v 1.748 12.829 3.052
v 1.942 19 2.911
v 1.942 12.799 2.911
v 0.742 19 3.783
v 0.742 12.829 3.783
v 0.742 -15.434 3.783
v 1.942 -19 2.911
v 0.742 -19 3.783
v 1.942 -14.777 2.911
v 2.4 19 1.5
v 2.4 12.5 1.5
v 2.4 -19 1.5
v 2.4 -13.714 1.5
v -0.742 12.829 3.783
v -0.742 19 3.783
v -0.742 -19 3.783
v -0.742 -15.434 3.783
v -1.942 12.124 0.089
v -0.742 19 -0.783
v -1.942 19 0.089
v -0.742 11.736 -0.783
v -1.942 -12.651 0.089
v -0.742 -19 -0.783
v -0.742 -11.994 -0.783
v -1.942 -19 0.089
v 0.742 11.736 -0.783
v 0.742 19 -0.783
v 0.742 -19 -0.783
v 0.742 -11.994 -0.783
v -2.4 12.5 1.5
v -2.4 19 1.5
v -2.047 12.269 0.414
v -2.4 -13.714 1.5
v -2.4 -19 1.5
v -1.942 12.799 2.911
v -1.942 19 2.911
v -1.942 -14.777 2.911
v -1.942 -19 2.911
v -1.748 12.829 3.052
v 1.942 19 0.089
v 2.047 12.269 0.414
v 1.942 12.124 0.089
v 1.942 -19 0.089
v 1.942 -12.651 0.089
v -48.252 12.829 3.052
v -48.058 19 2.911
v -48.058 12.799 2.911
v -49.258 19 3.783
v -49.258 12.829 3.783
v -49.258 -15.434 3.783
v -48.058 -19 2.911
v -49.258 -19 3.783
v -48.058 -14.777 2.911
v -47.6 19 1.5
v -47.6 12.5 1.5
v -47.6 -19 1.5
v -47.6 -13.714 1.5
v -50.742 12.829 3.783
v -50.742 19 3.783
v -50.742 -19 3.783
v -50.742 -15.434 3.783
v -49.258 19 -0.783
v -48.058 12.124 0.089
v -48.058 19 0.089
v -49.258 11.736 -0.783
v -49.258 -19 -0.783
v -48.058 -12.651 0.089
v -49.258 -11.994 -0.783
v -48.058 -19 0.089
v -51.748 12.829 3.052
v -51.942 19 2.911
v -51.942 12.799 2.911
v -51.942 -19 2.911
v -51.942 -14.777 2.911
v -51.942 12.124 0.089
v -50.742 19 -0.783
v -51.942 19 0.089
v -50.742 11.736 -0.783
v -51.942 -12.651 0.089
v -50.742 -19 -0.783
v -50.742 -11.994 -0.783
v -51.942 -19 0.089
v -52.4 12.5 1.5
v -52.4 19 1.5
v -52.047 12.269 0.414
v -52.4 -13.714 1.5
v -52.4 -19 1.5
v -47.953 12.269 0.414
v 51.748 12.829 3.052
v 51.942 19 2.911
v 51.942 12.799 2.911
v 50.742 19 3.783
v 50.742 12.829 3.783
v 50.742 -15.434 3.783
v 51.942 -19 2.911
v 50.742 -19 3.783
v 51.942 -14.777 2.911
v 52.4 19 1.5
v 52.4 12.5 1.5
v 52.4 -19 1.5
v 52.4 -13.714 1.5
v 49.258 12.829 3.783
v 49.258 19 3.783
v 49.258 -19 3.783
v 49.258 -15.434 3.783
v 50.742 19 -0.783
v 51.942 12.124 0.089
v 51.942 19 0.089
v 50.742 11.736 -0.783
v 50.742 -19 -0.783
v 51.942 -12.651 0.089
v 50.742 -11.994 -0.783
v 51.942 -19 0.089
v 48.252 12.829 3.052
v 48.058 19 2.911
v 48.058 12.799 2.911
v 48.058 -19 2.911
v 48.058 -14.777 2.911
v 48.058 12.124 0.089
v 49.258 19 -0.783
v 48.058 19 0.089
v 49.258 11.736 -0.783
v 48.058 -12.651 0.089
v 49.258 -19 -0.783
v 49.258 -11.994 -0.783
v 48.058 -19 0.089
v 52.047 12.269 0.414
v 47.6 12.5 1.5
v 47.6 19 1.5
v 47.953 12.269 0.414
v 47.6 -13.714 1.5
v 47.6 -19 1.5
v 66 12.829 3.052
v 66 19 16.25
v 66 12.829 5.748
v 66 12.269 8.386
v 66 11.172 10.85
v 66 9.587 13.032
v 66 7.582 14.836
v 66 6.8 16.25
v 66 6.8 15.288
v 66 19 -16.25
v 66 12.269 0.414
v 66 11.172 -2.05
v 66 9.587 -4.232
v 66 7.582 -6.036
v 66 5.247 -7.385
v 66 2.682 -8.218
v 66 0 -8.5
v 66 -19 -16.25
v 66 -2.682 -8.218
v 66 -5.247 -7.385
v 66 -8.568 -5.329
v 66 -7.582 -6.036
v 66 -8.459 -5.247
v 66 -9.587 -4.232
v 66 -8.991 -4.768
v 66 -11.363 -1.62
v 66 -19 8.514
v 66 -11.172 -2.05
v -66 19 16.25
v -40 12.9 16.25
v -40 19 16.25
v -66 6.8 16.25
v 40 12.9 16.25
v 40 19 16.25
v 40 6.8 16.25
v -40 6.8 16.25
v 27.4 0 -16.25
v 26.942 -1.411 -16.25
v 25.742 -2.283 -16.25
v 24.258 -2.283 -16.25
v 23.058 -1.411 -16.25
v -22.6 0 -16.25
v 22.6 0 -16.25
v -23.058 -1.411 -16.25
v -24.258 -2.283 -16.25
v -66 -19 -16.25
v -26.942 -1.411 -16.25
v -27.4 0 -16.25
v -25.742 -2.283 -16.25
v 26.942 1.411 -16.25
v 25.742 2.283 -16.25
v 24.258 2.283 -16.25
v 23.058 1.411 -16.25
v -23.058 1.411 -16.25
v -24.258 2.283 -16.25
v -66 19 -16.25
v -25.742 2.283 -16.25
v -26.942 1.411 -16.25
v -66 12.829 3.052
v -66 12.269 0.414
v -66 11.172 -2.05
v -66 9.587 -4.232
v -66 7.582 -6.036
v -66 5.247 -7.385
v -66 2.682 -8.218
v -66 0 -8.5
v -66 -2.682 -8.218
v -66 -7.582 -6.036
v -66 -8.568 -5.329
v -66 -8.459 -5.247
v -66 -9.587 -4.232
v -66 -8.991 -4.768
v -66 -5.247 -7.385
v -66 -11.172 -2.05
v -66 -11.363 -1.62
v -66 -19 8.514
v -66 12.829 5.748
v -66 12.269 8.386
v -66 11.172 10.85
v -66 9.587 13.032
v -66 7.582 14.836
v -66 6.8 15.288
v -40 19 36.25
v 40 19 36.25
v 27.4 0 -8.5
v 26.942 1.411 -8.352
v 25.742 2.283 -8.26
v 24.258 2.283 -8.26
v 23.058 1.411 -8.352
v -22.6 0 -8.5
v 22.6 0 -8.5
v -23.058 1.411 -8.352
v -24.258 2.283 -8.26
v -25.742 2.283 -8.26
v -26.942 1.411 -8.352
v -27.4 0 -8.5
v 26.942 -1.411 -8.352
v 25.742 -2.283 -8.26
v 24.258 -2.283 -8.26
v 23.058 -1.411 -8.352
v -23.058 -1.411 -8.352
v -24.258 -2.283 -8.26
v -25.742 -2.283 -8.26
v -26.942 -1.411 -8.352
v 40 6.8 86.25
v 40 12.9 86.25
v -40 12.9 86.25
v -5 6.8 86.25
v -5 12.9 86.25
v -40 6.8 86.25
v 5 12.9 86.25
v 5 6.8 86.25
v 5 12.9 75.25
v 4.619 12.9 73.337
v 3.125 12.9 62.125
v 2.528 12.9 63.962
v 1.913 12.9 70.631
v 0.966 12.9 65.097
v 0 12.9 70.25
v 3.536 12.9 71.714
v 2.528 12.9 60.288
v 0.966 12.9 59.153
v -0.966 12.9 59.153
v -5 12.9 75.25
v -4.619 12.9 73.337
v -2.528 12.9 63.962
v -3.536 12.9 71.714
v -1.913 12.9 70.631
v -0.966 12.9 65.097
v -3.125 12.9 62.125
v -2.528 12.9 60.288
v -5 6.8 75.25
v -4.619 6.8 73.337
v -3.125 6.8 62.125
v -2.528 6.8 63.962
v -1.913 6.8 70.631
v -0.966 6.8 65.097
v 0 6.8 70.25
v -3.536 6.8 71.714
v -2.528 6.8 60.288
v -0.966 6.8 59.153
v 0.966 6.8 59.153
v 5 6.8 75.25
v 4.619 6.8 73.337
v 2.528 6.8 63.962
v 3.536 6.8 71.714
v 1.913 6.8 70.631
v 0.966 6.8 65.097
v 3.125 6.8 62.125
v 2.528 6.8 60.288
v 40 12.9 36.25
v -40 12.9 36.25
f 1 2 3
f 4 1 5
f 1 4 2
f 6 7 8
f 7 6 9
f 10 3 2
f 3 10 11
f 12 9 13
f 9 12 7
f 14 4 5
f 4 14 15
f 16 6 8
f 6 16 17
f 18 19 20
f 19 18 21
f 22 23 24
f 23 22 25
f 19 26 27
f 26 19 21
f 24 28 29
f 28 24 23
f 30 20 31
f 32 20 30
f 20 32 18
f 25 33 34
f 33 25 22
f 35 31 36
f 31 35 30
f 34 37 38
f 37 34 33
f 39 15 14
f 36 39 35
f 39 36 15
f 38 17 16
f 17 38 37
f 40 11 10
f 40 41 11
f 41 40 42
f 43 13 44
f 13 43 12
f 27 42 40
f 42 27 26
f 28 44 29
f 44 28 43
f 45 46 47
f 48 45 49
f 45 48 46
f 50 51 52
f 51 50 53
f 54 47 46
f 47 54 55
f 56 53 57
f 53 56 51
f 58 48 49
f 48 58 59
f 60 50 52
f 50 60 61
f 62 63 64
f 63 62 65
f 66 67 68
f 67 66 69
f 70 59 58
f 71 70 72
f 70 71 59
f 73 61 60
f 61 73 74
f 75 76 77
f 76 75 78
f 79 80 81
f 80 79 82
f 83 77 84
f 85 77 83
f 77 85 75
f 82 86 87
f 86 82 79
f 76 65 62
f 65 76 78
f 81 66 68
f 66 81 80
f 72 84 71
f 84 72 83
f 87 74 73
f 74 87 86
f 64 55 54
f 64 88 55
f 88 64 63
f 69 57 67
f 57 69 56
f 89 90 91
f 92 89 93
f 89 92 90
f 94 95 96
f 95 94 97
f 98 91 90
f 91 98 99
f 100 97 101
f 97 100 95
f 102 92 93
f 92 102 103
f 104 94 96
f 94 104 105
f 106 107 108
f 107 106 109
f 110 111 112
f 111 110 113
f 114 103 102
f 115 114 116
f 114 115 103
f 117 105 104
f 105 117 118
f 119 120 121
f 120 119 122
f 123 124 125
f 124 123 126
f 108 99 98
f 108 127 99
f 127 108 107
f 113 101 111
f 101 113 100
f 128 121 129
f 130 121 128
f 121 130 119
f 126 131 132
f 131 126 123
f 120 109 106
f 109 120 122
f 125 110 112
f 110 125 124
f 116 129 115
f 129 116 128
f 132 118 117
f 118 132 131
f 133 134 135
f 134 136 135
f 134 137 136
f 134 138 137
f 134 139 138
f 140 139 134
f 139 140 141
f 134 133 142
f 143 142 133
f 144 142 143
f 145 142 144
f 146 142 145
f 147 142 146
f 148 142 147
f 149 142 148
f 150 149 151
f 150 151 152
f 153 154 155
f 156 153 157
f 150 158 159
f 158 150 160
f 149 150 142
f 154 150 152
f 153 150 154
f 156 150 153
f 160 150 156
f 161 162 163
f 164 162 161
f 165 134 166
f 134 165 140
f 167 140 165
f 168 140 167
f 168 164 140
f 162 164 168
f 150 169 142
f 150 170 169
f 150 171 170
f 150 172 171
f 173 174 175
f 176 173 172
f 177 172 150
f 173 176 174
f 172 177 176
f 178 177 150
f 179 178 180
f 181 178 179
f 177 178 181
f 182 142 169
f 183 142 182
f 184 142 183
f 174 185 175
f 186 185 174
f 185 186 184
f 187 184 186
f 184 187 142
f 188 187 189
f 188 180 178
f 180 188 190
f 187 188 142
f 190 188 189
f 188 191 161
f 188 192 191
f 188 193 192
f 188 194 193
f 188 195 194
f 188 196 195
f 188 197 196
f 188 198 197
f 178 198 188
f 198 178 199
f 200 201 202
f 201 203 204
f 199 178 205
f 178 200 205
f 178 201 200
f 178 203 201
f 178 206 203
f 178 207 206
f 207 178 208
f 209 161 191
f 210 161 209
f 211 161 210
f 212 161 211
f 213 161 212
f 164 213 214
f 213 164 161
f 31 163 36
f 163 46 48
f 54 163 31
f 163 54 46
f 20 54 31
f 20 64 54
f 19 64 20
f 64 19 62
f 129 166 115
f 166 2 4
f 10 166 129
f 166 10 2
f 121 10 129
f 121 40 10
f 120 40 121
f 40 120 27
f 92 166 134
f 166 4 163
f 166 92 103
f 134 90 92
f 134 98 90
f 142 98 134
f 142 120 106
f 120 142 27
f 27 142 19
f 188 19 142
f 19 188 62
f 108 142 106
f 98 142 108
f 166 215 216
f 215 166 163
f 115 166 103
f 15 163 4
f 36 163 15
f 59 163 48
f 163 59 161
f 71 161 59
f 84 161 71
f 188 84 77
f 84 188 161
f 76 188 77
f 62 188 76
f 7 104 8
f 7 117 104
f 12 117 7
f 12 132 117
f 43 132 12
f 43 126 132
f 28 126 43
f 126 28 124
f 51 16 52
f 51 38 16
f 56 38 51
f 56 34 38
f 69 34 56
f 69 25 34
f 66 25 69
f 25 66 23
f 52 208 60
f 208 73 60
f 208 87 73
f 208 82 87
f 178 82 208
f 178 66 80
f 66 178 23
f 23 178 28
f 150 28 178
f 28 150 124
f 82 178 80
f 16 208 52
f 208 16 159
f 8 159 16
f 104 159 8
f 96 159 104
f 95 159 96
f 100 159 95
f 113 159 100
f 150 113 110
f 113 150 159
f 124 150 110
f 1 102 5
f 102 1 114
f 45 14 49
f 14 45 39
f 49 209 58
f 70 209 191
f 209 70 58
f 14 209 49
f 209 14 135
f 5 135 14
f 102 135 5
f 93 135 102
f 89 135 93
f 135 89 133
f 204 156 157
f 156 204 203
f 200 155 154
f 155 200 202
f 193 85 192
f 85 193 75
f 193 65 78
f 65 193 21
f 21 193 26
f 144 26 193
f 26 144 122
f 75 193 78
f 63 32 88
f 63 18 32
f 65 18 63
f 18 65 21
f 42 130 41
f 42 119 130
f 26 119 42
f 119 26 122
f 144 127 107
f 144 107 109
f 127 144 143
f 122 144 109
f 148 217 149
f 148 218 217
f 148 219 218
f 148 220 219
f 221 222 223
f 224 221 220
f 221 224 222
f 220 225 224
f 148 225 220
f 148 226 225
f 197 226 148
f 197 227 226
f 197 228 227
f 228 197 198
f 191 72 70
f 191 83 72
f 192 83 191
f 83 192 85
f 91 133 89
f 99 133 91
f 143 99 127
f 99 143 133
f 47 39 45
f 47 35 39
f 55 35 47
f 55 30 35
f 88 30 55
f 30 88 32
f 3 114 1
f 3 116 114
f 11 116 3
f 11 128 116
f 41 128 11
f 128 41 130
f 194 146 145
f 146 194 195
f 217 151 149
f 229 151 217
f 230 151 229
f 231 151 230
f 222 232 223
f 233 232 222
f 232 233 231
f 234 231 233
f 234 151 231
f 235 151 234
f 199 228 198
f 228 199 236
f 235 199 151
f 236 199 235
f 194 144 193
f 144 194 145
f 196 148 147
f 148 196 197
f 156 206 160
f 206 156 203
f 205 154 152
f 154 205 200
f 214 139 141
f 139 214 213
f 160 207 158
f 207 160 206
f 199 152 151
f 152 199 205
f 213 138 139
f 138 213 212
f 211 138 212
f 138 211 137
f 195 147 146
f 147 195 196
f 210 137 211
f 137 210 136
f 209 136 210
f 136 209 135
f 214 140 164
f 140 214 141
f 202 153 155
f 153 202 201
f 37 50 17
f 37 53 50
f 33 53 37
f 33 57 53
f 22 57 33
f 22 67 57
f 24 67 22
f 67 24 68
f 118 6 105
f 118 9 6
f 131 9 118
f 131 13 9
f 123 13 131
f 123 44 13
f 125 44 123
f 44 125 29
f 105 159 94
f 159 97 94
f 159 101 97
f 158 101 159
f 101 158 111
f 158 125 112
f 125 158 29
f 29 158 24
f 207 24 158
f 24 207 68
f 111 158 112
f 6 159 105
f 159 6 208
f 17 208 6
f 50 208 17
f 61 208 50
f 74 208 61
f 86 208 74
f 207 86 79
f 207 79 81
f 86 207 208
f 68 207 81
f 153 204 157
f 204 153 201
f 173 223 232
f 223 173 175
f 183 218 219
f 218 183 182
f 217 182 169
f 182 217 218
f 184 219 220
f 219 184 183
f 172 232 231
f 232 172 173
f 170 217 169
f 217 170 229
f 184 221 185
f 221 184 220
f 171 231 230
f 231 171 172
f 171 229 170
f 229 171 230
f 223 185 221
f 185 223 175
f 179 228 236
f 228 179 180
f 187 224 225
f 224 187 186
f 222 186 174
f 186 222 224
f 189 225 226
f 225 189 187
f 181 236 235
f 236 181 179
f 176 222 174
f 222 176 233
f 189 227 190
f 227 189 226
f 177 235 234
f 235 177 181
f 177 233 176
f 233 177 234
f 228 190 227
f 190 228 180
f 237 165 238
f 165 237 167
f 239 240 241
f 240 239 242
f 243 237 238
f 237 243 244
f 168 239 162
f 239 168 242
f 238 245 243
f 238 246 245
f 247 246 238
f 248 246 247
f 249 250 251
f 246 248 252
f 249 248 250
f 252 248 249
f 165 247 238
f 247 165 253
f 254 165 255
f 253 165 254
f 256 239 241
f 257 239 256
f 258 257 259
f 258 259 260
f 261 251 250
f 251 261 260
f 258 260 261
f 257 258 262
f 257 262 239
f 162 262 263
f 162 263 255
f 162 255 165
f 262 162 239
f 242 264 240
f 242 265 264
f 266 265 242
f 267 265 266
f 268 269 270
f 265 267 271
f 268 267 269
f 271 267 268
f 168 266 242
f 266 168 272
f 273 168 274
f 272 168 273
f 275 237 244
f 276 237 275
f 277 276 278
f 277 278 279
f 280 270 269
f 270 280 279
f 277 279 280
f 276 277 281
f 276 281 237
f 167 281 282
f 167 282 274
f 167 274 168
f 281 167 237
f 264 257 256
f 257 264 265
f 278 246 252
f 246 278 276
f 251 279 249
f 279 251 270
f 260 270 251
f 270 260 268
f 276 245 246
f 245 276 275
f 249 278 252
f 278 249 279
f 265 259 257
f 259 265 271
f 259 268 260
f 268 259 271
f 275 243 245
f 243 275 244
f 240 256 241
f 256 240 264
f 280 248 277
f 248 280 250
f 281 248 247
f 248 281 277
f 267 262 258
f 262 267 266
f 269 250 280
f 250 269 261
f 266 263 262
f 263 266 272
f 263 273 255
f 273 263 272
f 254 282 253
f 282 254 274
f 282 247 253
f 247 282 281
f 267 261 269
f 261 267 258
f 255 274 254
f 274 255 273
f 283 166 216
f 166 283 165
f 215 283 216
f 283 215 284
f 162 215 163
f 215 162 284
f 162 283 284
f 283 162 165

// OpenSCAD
nakladka_sz = 38; //31.4
nakladka_dl = 132;
nakladka_h = 32.5;
dno_grubosc = 7.75;

rama_sr = 25.8;

sruba_sr = 4.8;
sruba_od_dna = 15.35;
sruba_od_boku = 12.7;
sruby_odstep = 50;

mocowanie_h = 50+20; //35
mocowanie_sr1 = 10; // lub 12
mocowanie_gr = (nakladka_sz-rama_sr)/2;
mocowanie_dl = 80;

module sruba_dziura(sr){
    rotate([90,0,0]){
        cylinder(h=nakladka_sz+30, d=sr, center=true, $fn=10);
        
    }
}

module mocowanie(h, sr1, gr, dl, sr2){
    difference(){
    cube([dl, gr, h],center = true);
    
    translate([0,0,h/2-16+sr1/2]){
    rotate([90,0,0]){
      cylinder(gr+10, d=sr1, center=true);   
    }
    }
    translate([0,0,h-16+sr1/2]){
        cube([sr1, gr+10, h],center = true);
    }
    translate([0,0,h/2-16-sr2/2-5]){
    rotate([90,0,0]){
    cylinder(gr+10, d=sr2, center=true);
    }
    }
    
    }
}

union(){
    difference(){
        cube([nakladka_dl, nakladka_sz, nakladka_h], center=true);
        
        translate([0,0,-nakladka_h/2+dno_grubosc+rama_sr/2]){
        rotate([0,90,0]){
            #cylinder(h=nakladka_dl+30, d=rama_sr, center=true);
            
        }
        }
        
        rotate([0,0,0]){
        translate([0,-mocowanie_gr/2,dno_grubosc+rama_sr/2]){
            #cube([nakladka_dl+30, rama_sr-mocowanie_gr, nakladka_h],center = true);
        }}
        
        rotate([37,0,0]){
        translate([0,-mocowanie_gr/2+3+0.2,dno_grubosc+rama_sr/2-3.5]){
            #cube([nakladka_dl+30, rama_sr-mocowanie_gr+0.7, nakladka_h],center = true);
        }}
      
        
        translate([0,0,-nakladka_h/2+sruba_sr/2+sruba_od_dna]){
            sruba_dziura(sruba_sr);
            
            translate([-sruby_odstep,0,0]){
               sruba_dziura(sruba_sr); 
            }
            
             translate([sruby_odstep,0,0]){
               sruba_dziura(sruba_sr); 
            }
            
        }
        translate([25,0,0]){
            rotate([-90,0,0]){
                sruba_dziura(sruba_sr); 
            }
        }
         translate([-25,0,0]){
            rotate([-90,0,0]){
                sruba_dziura(sruba_sr); 
            }
        }
    }

    translate([0,nakladka_sz/2-mocowanie_gr/2-mocowanie_gr,nakladka_h/2+mocowanie_h/2]){
        mocowanie(mocowanie_h, mocowanie_sr1, mocowanie_gr, mocowanie_dl, 6.25);
    }
    translate([0,nakladka_sz/2-mocowanie_gr/2,nakladka_h/2+5]){
        cube([mocowanie_dl, mocowanie_gr, 30], center=true);
    }
    

}
